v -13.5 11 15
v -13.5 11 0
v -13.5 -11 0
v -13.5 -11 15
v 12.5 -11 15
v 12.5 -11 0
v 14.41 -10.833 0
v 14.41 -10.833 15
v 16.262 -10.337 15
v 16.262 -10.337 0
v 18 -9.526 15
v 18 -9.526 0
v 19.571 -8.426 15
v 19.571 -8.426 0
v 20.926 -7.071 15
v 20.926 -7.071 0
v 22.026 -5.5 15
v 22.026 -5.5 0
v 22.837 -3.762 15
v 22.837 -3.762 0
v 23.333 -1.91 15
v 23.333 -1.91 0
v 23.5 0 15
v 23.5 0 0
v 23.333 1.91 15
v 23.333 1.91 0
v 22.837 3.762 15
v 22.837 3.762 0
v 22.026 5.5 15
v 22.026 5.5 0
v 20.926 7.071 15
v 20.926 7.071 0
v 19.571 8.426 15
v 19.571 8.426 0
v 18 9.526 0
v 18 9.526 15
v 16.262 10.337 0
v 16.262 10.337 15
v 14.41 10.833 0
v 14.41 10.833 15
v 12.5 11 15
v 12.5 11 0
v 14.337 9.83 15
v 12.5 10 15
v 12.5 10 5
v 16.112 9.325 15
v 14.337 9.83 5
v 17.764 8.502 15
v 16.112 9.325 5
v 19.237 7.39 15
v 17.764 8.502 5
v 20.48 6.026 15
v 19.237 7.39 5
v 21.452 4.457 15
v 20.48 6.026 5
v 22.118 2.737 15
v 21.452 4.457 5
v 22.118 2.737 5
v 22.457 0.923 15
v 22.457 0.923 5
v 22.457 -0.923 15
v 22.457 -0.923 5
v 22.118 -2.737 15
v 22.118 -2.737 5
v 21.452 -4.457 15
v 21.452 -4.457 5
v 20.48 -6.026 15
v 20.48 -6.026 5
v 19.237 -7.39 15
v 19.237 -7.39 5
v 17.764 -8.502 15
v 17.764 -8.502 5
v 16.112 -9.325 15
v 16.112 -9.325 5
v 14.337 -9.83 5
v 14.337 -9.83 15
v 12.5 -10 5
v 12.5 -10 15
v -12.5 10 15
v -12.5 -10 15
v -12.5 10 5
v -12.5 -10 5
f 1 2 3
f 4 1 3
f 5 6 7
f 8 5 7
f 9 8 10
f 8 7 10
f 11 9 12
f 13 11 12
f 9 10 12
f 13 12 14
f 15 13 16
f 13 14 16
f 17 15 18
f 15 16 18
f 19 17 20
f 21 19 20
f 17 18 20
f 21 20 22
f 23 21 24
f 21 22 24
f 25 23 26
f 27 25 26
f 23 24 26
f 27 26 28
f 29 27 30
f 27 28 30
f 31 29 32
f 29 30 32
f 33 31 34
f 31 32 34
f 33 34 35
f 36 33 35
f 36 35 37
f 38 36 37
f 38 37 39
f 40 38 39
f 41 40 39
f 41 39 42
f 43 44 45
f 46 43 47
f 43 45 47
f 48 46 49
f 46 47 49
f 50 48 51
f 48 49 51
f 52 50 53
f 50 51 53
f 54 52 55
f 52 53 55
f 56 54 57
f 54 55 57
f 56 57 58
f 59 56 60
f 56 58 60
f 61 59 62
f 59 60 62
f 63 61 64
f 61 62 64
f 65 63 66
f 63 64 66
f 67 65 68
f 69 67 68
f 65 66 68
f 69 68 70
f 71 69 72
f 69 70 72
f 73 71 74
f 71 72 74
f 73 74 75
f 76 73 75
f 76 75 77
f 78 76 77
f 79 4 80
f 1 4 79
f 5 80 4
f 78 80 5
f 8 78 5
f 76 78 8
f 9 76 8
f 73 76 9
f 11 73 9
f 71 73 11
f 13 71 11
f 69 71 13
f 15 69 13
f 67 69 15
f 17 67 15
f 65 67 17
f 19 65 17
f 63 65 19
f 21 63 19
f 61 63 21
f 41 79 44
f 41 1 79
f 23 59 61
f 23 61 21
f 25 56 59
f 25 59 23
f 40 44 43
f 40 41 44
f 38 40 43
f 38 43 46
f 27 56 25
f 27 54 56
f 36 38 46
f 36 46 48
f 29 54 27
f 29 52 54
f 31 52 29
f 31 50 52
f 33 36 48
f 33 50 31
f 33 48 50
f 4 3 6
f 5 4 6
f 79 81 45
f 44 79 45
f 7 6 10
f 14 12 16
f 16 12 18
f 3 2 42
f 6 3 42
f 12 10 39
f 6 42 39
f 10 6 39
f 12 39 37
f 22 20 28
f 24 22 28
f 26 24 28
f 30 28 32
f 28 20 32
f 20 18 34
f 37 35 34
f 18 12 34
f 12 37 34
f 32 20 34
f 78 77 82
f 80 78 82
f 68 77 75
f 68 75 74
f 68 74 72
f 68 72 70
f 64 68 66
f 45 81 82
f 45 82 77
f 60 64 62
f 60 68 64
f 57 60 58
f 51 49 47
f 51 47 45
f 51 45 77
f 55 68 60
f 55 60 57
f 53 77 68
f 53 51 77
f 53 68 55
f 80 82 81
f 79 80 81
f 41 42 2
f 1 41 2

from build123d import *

# Parameters (mm, degrees)
F1_DEPTH = 15
F0_W     = 25
F0_H     = 20
F2_DEPTH = 5


with BuildPart() as f1:
    # F0 (on Top) → F1 (new body)
    with BuildSketch(Plane.XY):
        with BuildLine():
            ThreePointArc((12.5, -11), (23.5, 0), (12.5, 11))
            Line((12.5, 11), (-13.5, 11))
            Line((-13.5, 11), (-13.5, -11))
            Line((-13.5, -11), (12.5, -11))
        make_face()
        with BuildLine():
            Line((-12.5, 10), (12.5, 10))
            ThreePointArc((12.5, 10), (22.5, 0), (12.5, -10))
            Line((12.5, -10), (-12.5, -10))
            Line((-12.5, -10), (-12.5, 10))
        make_face(mode=Mode.SUBTRACT)
    extrude(amount=F1_DEPTH)

    # F0 (on Top) → F2 (join)
    with BuildSketch(Plane.XY):
        Rectangle(F0_W, F0_H)
        with BuildLine():
            ThreePointArc((12.5, -10), (22.5, 0), (12.5, 10))
            Line((12.5, 10), (12.5, -10))
        make_face()
    extrude(amount=F2_DEPTH)


solid = f1.part
